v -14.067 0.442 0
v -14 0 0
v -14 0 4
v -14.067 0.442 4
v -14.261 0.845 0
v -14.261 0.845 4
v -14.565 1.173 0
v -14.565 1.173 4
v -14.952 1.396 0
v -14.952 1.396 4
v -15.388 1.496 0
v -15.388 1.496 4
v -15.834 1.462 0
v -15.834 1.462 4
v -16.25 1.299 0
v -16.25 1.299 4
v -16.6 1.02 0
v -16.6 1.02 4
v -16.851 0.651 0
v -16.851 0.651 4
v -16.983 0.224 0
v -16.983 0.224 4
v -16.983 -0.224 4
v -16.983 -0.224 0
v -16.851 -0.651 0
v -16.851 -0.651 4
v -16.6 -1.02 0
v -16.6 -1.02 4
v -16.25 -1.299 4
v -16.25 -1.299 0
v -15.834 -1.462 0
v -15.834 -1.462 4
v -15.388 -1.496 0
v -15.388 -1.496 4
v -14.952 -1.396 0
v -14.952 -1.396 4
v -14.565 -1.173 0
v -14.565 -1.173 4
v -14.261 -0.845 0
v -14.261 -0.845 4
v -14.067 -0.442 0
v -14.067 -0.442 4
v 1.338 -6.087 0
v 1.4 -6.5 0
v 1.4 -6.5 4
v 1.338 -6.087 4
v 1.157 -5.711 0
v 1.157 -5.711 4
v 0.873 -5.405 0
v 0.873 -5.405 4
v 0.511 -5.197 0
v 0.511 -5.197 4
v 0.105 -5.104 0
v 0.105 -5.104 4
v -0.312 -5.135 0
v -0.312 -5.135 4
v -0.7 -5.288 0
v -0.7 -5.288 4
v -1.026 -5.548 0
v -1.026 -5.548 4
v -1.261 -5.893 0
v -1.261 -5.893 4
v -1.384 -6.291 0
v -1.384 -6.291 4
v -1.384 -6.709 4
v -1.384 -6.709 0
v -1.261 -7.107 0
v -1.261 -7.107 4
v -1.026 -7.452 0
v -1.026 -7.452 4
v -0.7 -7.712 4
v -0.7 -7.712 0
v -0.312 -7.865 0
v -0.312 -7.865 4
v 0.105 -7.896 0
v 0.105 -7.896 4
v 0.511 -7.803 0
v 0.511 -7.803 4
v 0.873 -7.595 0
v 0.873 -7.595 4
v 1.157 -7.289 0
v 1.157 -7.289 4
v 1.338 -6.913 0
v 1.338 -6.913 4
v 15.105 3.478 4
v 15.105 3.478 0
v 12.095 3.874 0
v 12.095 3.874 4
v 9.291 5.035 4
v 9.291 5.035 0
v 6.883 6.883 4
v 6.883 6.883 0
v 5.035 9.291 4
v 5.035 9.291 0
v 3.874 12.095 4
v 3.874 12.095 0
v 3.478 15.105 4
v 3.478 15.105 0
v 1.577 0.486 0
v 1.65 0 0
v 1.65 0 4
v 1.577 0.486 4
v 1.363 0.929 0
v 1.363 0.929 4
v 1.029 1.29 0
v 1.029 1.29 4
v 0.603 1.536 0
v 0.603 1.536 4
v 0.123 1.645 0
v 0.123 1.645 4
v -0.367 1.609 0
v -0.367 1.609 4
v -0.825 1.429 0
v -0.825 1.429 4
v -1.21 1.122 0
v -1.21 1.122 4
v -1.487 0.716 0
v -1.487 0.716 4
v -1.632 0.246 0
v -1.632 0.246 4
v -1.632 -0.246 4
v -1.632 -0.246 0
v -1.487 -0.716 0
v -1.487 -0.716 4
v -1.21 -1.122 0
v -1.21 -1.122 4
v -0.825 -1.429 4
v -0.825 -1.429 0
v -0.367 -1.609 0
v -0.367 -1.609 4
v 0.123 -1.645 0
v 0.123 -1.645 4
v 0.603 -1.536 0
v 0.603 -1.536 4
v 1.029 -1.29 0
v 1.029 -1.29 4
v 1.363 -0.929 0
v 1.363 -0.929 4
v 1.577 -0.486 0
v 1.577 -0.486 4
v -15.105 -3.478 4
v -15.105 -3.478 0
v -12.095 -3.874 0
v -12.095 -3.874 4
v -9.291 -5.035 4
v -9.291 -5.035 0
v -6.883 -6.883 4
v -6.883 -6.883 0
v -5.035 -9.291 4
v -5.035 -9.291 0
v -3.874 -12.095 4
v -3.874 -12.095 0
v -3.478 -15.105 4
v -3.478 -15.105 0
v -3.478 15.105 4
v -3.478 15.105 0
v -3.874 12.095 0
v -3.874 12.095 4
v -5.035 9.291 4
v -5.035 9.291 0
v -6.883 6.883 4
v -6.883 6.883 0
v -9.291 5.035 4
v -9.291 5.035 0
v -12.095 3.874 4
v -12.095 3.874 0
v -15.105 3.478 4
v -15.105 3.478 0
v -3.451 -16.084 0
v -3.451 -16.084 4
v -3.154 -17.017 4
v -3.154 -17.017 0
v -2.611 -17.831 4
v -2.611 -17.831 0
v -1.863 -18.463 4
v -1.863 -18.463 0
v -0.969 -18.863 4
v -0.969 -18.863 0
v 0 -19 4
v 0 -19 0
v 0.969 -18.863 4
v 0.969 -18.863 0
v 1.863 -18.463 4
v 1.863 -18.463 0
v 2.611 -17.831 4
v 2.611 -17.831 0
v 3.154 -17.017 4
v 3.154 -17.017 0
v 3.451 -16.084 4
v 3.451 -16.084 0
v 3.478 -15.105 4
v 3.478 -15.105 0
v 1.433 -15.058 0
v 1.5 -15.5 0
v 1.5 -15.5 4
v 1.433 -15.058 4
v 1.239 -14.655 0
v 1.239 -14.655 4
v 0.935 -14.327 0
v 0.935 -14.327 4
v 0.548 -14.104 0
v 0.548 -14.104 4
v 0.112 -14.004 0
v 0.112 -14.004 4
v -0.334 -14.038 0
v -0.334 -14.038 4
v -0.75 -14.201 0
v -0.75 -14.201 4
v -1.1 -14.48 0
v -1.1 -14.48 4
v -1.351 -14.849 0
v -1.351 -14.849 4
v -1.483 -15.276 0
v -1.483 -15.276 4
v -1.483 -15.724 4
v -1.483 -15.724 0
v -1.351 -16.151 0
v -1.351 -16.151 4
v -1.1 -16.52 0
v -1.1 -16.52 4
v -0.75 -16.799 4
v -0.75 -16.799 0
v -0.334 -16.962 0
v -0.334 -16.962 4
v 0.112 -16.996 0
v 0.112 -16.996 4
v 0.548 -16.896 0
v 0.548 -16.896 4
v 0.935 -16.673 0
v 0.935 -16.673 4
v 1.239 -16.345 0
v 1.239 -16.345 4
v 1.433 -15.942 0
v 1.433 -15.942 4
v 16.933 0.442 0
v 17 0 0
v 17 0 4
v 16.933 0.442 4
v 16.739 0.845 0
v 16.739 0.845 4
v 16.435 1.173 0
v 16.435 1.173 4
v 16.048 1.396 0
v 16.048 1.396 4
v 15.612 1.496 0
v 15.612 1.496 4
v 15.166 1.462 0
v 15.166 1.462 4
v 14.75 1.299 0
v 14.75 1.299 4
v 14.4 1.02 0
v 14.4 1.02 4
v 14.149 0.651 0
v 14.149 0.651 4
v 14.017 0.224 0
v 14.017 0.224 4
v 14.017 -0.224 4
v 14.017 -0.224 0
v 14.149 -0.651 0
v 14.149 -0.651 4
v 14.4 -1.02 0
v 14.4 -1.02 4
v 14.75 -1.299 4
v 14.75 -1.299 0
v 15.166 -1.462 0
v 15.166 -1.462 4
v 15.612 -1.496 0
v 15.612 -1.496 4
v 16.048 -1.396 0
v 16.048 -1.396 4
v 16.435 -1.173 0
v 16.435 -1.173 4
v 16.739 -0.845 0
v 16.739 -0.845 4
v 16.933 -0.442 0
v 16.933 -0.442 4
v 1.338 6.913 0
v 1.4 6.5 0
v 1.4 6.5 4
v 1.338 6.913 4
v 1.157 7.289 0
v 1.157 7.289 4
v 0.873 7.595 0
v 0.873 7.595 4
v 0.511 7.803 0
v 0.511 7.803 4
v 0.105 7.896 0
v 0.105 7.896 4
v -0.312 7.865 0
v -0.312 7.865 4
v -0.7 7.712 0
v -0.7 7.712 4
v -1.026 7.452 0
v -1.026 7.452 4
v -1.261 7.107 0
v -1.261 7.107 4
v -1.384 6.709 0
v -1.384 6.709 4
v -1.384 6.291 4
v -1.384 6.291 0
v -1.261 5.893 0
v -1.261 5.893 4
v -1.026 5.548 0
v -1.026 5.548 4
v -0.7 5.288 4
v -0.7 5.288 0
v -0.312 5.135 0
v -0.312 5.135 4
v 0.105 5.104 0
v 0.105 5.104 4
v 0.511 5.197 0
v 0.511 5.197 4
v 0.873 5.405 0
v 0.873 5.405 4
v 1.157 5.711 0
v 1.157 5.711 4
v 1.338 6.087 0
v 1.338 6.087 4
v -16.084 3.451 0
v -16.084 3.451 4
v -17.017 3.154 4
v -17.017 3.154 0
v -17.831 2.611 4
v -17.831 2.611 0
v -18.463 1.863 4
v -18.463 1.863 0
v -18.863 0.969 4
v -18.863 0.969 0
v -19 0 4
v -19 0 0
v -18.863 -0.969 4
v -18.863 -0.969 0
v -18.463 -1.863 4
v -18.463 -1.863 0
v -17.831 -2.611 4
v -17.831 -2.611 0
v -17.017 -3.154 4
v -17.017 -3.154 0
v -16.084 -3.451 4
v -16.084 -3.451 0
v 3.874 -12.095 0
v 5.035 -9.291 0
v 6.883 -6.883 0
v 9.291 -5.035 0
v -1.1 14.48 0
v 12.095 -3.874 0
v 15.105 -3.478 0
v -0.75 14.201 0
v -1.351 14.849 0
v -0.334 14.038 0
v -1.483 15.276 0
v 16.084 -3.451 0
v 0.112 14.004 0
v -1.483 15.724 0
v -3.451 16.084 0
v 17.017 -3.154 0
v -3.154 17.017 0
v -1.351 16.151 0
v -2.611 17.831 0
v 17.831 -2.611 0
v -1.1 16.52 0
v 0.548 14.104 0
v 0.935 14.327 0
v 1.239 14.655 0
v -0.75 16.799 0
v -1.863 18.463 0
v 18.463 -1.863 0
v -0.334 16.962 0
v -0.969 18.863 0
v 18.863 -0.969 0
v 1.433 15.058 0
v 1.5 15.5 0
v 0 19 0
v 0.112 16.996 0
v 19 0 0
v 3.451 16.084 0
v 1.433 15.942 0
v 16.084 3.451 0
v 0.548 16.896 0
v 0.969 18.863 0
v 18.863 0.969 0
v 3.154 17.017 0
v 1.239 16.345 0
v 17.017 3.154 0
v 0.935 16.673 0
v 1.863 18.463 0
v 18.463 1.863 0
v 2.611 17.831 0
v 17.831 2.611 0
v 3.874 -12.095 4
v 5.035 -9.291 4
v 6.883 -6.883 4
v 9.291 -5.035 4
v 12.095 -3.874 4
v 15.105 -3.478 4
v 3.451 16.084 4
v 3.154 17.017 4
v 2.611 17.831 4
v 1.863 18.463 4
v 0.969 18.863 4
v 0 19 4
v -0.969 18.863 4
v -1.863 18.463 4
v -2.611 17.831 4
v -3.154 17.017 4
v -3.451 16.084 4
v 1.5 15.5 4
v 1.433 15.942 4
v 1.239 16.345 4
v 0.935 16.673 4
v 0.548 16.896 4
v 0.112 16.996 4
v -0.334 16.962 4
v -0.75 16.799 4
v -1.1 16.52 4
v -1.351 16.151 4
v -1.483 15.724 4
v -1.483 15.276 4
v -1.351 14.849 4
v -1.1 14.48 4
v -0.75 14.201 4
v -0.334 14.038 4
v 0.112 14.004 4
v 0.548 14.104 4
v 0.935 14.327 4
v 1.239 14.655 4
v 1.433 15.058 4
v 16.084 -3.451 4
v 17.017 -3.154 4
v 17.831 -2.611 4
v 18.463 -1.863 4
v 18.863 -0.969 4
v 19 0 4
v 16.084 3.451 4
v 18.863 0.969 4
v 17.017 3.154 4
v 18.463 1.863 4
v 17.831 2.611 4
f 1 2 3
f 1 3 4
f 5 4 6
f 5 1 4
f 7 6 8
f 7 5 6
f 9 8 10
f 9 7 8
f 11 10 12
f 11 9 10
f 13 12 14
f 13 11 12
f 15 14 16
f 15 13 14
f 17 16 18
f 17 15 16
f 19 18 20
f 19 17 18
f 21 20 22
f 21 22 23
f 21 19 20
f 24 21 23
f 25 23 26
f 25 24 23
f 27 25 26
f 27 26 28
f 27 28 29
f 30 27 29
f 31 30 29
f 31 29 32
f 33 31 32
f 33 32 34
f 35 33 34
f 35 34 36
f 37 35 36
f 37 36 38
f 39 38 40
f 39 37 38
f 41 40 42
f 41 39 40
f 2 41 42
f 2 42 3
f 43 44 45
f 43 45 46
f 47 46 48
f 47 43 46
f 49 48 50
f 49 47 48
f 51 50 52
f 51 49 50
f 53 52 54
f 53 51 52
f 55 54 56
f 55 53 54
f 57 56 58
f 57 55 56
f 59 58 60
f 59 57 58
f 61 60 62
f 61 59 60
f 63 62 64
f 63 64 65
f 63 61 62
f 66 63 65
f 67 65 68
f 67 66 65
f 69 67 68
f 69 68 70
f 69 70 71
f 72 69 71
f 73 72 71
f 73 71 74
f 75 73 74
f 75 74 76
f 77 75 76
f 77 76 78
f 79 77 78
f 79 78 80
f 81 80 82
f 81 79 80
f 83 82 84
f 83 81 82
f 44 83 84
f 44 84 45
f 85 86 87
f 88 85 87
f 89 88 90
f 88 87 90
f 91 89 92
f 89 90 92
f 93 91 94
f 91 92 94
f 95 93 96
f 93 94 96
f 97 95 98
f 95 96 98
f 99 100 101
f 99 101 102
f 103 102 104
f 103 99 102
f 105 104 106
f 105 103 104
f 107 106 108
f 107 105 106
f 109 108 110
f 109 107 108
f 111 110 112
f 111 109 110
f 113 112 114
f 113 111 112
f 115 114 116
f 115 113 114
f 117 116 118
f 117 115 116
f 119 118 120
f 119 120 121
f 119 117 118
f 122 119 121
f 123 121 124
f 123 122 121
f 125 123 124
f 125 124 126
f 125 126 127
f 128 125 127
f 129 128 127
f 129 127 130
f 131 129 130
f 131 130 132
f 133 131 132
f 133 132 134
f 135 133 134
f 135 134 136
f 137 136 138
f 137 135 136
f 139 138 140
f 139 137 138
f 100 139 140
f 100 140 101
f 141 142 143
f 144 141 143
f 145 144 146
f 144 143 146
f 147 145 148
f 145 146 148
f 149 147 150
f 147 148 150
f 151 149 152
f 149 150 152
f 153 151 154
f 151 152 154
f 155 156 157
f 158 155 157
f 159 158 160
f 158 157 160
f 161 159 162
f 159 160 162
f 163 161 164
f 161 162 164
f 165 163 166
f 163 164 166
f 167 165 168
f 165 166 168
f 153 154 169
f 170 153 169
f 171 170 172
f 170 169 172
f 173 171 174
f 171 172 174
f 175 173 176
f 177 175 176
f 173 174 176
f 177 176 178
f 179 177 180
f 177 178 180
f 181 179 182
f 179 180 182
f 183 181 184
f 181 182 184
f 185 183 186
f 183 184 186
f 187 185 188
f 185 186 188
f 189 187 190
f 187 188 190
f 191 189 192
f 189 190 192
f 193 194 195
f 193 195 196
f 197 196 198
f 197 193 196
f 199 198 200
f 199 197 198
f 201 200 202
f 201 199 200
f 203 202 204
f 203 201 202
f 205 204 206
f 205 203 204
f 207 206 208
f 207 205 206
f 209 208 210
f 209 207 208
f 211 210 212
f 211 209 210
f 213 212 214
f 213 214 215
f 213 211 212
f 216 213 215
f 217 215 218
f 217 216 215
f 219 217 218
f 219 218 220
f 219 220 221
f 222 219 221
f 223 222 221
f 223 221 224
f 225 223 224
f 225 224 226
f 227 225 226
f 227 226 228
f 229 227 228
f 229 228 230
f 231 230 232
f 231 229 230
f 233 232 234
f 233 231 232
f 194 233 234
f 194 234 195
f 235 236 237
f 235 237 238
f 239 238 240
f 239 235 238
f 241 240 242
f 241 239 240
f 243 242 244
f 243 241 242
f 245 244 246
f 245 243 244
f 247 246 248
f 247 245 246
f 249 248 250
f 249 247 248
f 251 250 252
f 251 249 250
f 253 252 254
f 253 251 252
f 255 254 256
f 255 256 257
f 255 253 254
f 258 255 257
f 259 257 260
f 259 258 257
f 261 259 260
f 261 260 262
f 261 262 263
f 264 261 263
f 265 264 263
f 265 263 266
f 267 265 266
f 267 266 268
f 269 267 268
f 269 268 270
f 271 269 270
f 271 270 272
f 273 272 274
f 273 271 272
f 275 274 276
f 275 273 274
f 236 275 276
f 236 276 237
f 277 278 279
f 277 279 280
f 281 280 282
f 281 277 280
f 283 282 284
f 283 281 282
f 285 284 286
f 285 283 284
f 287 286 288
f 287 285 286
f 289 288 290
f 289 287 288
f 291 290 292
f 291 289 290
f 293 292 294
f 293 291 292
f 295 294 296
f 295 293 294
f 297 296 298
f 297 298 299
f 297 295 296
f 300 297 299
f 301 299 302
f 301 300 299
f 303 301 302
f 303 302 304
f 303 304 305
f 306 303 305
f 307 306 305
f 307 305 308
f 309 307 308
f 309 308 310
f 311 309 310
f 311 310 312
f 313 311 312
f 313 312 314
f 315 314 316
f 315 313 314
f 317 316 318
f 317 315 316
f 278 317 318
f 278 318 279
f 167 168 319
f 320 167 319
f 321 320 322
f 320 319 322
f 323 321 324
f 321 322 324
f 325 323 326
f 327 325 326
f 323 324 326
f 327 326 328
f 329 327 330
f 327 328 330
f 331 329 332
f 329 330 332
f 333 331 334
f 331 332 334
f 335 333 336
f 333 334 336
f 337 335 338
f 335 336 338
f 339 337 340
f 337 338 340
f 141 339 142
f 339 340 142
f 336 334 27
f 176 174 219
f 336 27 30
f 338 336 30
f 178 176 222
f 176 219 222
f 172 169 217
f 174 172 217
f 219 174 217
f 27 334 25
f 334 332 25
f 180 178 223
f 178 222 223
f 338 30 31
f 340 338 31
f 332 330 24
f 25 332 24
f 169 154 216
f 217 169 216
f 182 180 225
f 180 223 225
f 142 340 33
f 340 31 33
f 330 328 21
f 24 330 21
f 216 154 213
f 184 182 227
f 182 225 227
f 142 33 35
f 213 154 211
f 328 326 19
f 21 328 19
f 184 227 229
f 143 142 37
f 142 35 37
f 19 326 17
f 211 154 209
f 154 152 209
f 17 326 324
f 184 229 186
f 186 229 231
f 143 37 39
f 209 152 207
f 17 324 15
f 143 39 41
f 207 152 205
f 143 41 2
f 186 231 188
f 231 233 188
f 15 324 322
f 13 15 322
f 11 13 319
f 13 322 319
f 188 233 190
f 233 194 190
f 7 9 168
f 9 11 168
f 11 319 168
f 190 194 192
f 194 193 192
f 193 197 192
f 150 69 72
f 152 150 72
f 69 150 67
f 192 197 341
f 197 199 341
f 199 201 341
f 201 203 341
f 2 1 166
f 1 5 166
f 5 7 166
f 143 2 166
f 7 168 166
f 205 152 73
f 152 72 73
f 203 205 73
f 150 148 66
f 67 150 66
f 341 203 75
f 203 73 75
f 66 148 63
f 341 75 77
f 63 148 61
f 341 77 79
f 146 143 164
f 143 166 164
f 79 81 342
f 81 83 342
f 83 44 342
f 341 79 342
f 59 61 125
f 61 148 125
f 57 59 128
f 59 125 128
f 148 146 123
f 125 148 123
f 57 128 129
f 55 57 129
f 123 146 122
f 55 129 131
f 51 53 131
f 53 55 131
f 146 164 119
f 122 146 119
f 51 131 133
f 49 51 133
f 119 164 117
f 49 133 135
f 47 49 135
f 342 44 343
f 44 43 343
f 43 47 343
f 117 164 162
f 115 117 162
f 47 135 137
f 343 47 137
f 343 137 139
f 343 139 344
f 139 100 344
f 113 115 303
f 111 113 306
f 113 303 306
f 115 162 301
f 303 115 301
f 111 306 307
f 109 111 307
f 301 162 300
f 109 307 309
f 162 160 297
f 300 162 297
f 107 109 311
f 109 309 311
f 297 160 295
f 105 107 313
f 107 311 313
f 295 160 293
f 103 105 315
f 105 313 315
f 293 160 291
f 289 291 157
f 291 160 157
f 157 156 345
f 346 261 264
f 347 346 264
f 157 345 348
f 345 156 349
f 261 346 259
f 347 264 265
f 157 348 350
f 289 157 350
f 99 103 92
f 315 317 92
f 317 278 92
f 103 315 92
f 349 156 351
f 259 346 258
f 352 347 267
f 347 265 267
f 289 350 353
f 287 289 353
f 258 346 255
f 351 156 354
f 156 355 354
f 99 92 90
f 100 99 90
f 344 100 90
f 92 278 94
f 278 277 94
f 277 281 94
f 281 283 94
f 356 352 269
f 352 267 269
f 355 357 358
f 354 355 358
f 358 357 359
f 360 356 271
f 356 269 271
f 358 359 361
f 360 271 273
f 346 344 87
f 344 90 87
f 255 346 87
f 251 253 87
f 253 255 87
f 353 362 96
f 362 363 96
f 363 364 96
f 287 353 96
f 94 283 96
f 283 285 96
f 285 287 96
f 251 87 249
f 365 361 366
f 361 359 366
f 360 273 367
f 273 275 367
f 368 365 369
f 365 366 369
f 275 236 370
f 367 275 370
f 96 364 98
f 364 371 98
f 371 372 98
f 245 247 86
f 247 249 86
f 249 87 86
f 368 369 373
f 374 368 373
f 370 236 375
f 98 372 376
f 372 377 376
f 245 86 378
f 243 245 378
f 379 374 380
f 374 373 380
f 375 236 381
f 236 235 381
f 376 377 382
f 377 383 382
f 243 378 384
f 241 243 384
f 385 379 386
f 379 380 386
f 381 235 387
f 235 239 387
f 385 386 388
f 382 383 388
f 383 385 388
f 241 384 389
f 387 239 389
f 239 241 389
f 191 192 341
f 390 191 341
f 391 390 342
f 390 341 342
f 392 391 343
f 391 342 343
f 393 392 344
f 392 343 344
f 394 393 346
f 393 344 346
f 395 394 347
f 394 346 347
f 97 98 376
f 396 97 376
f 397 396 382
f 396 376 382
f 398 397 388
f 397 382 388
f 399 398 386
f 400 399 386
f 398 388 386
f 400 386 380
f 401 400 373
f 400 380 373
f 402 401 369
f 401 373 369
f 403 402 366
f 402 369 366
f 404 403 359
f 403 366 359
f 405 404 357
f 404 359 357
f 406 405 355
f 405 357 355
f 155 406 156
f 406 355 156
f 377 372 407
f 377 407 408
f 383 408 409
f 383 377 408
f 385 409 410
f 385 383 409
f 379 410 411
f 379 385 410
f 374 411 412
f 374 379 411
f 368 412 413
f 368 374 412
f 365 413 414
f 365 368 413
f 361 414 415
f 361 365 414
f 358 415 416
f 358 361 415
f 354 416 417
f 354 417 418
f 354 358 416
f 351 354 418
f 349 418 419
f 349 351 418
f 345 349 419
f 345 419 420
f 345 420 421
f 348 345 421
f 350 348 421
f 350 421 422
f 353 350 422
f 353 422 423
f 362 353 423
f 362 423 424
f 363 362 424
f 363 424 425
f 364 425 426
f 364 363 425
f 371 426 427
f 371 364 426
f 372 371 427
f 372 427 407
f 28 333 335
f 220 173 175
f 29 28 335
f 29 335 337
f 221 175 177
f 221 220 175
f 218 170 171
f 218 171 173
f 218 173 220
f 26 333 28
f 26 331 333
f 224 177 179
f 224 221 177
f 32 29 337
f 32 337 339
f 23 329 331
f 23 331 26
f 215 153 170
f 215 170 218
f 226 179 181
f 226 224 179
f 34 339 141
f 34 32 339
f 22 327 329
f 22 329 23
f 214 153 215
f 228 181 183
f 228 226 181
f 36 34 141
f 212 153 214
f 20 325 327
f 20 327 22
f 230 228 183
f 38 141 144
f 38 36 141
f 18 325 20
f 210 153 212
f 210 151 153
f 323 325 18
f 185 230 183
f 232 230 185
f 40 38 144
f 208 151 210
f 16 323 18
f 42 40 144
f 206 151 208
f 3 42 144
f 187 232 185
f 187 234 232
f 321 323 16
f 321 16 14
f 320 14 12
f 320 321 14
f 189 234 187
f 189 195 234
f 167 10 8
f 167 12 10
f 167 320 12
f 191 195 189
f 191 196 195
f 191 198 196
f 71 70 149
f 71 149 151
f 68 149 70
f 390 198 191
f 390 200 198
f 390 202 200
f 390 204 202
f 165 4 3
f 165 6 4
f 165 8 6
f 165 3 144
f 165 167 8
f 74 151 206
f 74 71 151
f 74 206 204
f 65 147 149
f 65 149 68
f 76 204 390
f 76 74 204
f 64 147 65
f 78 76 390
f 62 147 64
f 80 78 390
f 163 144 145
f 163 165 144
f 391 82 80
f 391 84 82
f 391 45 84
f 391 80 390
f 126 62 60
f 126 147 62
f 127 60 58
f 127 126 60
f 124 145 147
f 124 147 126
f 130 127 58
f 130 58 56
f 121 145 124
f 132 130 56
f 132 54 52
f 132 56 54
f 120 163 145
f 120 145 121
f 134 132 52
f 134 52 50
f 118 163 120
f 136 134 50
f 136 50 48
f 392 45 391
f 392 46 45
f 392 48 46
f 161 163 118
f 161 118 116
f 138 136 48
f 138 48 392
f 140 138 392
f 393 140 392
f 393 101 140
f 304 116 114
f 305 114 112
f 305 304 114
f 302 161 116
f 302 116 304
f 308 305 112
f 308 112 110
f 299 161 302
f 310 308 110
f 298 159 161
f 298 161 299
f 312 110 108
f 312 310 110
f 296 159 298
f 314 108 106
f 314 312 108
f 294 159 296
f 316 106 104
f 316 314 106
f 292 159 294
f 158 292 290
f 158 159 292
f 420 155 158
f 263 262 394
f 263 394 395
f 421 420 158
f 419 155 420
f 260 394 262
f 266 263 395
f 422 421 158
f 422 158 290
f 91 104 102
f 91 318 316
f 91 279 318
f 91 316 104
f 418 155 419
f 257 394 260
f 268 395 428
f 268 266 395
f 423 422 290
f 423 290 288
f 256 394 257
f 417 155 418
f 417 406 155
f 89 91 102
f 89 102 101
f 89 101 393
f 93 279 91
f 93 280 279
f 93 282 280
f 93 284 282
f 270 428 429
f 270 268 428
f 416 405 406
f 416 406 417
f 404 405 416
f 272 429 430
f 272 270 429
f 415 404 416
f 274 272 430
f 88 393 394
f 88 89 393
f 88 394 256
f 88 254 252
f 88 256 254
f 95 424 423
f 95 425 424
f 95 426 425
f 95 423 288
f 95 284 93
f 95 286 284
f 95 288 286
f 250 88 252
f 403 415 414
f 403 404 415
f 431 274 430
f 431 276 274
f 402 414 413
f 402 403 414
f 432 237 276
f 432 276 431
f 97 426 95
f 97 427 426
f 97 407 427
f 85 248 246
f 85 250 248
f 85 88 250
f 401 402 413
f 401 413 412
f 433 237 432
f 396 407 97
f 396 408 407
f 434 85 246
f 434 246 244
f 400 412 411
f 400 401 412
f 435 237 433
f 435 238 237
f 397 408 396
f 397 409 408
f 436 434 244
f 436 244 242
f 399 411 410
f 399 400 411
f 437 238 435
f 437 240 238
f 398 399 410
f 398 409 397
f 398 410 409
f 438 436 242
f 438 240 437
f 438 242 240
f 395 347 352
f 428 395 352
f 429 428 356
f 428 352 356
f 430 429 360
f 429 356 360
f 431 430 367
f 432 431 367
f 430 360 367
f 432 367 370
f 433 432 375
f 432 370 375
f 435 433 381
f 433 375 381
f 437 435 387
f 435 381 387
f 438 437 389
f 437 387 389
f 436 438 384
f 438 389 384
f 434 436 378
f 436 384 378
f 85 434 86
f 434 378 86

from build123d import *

# Parameters (mm, degrees)
SKETCH_1_R      = 1.65
SKETCH_1_R_2    = 1.4
SKETCH_1_R_3    = 1.5
EXTRUDE_1_DEPTH = 4


with BuildPart() as part:
    # 草图1 → 凸台-拉伸1 (new body)
    with BuildSketch(Plane.XY):
        with BuildLine():
            ThreePointArc((-3.477620962, -15.10483871), (0, -19), (3.477620962, -15.10483871))
            ThreePointArc((3.477620962, -15.10483871), (6.883154194, -6.883154194), (15.10483871, -3.477620962))
            ThreePointArc((15.10483871, -3.477620962), (19, 0), (15.10483871, 3.477620962))
            ThreePointArc((15.10483871, 3.477620962), (6.883154194, 6.883154194), (3.477620962, 15.10483871))
            ThreePointArc((3.477620962, 15.10483871), (0, 19), (-3.477620962, 15.10483871))
            ThreePointArc((-3.477620962, 15.10483871), (-6.883154194, 6.883154194), (-15.10483871, 3.477620962))
            ThreePointArc((-15.10483871, 3.477620962), (-19, 0), (-15.10483871, -3.477620962))
            ThreePointArc((-15.10483871, -3.477620962), (-6.883154194, -6.883154194), (-3.477620962, -15.10483871))
        make_face()
        Circle(SKETCH_1_R, mode=Mode.SUBTRACT)
        with Locations((0, -6.5)):
            Circle(SKETCH_1_R_2, mode=Mode.SUBTRACT)
        with Locations((0, 6.5)):
            Circle(SKETCH_1_R_2, mode=Mode.SUBTRACT)
        with Locations((0, -15.5)):
            Circle(SKETCH_1_R_3, mode=Mode.SUBTRACT)
        with Locations((-15.5, 0)):
            Circle(SKETCH_1_R_3, mode=Mode.SUBTRACT)
        with Locations((0, 15.5)):
            Circle(SKETCH_1_R_3, mode=Mode.SUBTRACT)
        with Locations((15.5, 0)):
            Circle(SKETCH_1_R_3, mode=Mode.SUBTRACT)
    extrude(amount=EXTRUDE_1_DEPTH)


solid = part.part
